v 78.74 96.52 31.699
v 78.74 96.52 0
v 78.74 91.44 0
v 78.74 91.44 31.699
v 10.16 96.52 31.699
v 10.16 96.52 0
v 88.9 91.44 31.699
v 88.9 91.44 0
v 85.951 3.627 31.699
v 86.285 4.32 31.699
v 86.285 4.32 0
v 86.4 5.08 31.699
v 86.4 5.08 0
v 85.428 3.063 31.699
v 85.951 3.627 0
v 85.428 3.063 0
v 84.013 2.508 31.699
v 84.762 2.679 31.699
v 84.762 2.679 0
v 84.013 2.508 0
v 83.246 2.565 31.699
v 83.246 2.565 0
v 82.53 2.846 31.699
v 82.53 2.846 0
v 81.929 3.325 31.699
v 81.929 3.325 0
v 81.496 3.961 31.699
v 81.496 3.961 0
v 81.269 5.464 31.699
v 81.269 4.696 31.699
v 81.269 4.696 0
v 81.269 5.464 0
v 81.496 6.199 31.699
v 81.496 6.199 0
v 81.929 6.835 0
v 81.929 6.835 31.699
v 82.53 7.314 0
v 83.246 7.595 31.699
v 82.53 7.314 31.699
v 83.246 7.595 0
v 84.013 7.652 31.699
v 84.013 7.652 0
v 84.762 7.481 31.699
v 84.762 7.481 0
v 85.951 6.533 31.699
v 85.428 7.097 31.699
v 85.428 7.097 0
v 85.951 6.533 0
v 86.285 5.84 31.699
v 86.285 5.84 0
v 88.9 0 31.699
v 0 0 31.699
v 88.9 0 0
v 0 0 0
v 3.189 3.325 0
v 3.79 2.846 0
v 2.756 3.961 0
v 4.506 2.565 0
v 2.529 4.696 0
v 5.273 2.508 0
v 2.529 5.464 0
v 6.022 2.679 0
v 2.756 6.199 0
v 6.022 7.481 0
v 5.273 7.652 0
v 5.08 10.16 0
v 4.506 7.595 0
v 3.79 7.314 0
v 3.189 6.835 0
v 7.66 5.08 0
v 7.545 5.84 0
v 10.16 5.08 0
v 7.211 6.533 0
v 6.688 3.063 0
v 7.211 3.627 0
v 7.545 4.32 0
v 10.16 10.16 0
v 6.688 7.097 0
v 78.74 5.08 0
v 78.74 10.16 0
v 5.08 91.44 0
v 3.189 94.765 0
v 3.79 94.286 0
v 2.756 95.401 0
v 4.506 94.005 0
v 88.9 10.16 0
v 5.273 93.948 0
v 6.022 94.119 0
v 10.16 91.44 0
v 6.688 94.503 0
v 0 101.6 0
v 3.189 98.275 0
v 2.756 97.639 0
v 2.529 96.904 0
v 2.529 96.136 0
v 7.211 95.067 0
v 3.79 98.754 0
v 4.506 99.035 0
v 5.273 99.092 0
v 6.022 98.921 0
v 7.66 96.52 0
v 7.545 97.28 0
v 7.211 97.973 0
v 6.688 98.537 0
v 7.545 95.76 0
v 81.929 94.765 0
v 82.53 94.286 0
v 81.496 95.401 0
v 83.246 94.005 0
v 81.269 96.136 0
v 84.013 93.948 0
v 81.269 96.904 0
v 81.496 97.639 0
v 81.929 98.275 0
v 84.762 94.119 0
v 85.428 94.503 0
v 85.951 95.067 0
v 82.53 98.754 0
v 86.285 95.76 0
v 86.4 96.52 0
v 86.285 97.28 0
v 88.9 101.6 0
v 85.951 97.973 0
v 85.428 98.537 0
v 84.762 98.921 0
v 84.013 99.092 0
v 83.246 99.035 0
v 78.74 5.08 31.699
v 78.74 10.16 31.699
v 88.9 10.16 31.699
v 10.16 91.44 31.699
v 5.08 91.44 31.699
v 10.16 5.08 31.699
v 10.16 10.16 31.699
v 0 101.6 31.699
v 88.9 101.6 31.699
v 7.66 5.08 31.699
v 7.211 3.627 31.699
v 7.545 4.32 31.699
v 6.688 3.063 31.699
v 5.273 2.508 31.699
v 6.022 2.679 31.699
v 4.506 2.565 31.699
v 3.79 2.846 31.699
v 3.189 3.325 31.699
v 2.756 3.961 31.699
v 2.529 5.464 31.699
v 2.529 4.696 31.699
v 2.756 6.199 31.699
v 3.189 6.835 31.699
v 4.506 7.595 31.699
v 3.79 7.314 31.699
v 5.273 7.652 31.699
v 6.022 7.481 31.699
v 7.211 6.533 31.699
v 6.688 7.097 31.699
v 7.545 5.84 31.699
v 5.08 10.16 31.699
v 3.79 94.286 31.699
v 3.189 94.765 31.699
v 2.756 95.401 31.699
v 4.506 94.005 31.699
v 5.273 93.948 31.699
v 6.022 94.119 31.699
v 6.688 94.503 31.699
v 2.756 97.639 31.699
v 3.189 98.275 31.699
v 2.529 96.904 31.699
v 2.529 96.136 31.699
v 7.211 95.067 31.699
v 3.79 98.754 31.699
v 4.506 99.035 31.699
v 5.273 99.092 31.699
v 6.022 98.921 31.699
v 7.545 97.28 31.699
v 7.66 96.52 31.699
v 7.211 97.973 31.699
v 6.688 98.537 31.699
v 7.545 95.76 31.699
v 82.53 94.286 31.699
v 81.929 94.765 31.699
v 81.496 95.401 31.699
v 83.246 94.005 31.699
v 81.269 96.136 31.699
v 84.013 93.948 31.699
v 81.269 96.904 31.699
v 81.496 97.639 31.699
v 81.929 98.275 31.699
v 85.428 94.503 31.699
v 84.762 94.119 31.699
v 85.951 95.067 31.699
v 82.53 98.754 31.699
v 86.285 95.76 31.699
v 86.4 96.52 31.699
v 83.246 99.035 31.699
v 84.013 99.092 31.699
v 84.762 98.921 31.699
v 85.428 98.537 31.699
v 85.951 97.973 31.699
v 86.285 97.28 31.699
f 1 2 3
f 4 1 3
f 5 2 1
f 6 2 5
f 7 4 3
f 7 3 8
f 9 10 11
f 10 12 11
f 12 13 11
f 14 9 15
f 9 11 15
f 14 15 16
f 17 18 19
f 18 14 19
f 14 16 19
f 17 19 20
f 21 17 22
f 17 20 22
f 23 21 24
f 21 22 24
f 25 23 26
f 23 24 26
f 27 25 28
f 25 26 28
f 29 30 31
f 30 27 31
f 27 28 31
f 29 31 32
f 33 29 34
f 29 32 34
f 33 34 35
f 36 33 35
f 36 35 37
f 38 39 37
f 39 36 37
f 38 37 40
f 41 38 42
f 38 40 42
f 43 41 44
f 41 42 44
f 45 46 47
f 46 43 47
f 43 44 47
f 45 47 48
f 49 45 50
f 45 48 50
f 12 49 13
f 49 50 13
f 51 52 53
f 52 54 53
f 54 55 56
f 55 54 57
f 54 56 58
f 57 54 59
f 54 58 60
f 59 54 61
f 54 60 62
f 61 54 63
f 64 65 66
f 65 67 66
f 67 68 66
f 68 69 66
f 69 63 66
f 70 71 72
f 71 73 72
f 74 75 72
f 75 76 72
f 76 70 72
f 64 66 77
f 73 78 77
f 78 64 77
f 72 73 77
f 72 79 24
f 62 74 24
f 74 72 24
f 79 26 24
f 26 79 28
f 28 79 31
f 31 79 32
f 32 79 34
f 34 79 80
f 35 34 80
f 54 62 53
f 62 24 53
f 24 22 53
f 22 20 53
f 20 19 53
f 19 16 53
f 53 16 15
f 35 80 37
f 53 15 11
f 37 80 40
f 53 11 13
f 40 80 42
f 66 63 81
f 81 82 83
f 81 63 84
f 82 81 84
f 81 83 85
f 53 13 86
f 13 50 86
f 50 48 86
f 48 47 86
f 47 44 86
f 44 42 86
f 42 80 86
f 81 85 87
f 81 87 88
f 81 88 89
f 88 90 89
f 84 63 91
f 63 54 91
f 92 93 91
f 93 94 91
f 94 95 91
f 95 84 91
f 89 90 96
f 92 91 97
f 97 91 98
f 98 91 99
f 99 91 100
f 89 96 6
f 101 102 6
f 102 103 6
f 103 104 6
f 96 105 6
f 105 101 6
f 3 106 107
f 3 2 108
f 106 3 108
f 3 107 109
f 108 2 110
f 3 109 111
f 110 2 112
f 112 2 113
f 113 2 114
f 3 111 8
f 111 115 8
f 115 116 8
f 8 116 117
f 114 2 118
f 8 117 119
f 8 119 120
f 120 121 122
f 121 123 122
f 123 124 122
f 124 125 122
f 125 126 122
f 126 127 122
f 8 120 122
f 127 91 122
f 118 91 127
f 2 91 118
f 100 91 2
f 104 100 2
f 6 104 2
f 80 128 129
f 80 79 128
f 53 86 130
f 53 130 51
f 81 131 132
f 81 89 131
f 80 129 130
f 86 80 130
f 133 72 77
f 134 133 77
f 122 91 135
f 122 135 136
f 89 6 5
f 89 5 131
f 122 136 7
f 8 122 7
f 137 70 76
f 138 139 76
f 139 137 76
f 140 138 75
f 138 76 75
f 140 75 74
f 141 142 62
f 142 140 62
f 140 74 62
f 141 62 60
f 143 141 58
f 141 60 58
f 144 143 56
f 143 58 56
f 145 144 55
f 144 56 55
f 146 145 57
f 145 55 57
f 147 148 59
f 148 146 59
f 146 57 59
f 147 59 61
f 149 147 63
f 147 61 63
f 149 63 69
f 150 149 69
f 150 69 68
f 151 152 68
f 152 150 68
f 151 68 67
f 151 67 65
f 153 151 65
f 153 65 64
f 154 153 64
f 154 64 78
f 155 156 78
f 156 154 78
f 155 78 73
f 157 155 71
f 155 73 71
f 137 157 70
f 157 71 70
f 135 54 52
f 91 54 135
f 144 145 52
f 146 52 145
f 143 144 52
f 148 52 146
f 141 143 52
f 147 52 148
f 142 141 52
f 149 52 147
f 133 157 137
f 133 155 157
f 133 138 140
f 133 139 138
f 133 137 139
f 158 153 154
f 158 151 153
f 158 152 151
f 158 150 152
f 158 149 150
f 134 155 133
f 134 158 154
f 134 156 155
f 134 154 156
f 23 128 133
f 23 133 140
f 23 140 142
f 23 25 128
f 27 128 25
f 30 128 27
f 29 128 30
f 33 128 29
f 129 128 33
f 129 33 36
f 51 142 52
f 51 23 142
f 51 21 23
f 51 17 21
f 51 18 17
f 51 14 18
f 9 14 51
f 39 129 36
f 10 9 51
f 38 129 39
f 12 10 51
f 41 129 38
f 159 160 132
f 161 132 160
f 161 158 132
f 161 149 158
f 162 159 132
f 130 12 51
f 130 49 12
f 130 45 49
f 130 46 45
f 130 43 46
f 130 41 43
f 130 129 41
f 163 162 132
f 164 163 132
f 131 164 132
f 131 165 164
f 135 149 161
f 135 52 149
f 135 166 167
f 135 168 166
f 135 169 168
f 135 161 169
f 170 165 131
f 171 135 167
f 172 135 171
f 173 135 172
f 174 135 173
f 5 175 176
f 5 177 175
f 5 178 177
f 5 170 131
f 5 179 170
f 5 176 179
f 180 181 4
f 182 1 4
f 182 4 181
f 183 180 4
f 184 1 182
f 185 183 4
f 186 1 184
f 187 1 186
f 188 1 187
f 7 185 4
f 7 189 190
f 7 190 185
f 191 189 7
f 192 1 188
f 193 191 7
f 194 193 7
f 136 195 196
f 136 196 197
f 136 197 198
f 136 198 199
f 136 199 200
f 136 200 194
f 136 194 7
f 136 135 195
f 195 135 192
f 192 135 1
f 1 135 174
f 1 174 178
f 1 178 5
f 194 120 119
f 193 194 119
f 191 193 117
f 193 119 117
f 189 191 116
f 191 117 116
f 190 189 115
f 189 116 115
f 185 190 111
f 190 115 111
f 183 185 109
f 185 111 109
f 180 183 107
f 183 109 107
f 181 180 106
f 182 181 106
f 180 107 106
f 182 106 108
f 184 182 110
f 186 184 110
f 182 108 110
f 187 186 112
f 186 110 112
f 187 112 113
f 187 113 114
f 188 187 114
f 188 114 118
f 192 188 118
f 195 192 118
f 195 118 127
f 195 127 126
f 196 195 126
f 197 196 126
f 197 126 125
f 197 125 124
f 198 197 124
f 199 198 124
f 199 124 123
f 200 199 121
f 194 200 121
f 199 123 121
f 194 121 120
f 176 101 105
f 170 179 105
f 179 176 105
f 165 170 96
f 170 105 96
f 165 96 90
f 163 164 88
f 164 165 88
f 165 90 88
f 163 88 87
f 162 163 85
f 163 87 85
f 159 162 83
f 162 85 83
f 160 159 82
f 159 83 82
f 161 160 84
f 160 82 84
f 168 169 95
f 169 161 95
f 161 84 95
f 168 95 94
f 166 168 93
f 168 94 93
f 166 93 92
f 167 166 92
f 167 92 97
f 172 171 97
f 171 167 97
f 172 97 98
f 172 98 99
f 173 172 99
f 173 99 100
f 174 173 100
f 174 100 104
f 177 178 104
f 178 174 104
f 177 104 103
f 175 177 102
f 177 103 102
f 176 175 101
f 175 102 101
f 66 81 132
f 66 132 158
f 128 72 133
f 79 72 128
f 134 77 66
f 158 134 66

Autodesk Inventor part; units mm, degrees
ref_plane "YZ Plane" through (0, 0, 0) normal (1, 0, 0) x (0, 1, 0)
ref_plane "XZ Plane" through (0, 0, 0) normal (0, 1, 0) x (-1, 0, 0)
ref_plane "XY Plane" through (0, 0, 0) normal (0, 0, 1) x (1, 0, 0)
sketch "Sketch1" plane through (0, 0, 0) normal (0, 0, 1) x (1, 0, 0)
  line L0 (0, 0) -> (0, 101.6)
  line L1 (0, 101.6) -> (88.9, 101.6)
  line L2 (0, 0) -> (88.9, 0)
  arc A0 (88.9, 0) -> (88.9, 101.6) centre (-27.4974, 50.8) ccw
  line L3 (0, 101.6) -> (5.08, 101.6) construction
  line L4 (5.08, 101.6) -> (5.08, 96.52) construction
  circle A1 centre (5.08, 96.52) radius 2.5797
  line L5 (44.45, 101.6) -> (44.45, 0) construction
  line L6 (0, 50.8) -> (104.3223, 50.8) construction
  circle A2 centre (83.82, 96.52) radius 2.5797
  circle A3 centre (5.08, 5.08) radius 2.5797
  circle A4 centre (83.82, 5.08) radius 2.5797
  line L7 (0, 101.6) -> (10.16, 101.6) construction
  line L8 (0, 101.6) -> (0, 91.44) construction
  line L9 (10.16, 96.52) -> (10.16, 91.44)
  line L10 (10.16, 91.44) -> (5.08, 91.44)
  line L11 (5.08, 91.44) -> (5.08, 50.8)
  line L12 (10.16, 96.52) -> (44.45, 96.52)
  arc A5 (90.1405, 10.16) -> (90.1405, 91.44) centre (-27.4974, 50.8) ccw
  line L13 (84.2708, 99.06) -> (83.3692, 99.06)
  line L14 (78.74, 96.52) -> (78.74, 91.44)
  line L15 (78.74, 91.44) -> (90.1405, 91.44)
  line L16 (78.74, 96.52) -> (44.45, 96.52)
  line L17 (10.16, 5.08) -> (10.16, 10.16)
  line L18 (10.16, 10.16) -> (5.08, 10.16)
  line L19 (10.16, 5.08) -> (44.45, 5.08)
  line L20 (78.74, 5.08) -> (44.45, 5.08)
  line L21 (78.74, 5.08) -> (78.74, 10.16)
  line L22 (78.74, 10.16) -> (90.1405, 10.16)
  line L23 (5.08, 10.16) -> (5.08, 50.8)
  point P0 (78.74, 101.6)
  point P1 (88.9, 91.44)
  point P2 (10.16, 0)
  point P3 (0, 10.16)
  point P4 (78.74, 0)
  point P5 (88.9, 10.16)
  dimension "d0" = 101.6
  dimension "d1" = 88.9
  dimension "d2" = 88.9
  dimension "d3" = 127
  dimension "d4" = 5.08
  dimension "d5" = 5.08
  dimension "d6" = 5.1594
  dimension "d7" = 10.16
  dimension "d8" = 10.16
  dimension "d9" = 2.54
extrude "Extrusion1" add sketch "Sketch1" along normal blind 31.6992
sketch "Sketch2" plane through (0, 0, 31.6992) normal (0, 0, 1) x (1, 0, 0)
  line L0 (88.9, 0) -> (0, 0) projected
  line L1 (88.9, 0) -> (124.549, 0)
  line L2 (124.549, 0) -> (124.549, 101.6)
  line L3 (124.549, 101.6) -> (88.9, 101.6)
  line L4 (88.9, 101.6) -> (88.9, 0)
extrude "Extrusion2" cut sketch "Sketch2" against normal blind 31.6992
properties part number "Gearbox cover"
